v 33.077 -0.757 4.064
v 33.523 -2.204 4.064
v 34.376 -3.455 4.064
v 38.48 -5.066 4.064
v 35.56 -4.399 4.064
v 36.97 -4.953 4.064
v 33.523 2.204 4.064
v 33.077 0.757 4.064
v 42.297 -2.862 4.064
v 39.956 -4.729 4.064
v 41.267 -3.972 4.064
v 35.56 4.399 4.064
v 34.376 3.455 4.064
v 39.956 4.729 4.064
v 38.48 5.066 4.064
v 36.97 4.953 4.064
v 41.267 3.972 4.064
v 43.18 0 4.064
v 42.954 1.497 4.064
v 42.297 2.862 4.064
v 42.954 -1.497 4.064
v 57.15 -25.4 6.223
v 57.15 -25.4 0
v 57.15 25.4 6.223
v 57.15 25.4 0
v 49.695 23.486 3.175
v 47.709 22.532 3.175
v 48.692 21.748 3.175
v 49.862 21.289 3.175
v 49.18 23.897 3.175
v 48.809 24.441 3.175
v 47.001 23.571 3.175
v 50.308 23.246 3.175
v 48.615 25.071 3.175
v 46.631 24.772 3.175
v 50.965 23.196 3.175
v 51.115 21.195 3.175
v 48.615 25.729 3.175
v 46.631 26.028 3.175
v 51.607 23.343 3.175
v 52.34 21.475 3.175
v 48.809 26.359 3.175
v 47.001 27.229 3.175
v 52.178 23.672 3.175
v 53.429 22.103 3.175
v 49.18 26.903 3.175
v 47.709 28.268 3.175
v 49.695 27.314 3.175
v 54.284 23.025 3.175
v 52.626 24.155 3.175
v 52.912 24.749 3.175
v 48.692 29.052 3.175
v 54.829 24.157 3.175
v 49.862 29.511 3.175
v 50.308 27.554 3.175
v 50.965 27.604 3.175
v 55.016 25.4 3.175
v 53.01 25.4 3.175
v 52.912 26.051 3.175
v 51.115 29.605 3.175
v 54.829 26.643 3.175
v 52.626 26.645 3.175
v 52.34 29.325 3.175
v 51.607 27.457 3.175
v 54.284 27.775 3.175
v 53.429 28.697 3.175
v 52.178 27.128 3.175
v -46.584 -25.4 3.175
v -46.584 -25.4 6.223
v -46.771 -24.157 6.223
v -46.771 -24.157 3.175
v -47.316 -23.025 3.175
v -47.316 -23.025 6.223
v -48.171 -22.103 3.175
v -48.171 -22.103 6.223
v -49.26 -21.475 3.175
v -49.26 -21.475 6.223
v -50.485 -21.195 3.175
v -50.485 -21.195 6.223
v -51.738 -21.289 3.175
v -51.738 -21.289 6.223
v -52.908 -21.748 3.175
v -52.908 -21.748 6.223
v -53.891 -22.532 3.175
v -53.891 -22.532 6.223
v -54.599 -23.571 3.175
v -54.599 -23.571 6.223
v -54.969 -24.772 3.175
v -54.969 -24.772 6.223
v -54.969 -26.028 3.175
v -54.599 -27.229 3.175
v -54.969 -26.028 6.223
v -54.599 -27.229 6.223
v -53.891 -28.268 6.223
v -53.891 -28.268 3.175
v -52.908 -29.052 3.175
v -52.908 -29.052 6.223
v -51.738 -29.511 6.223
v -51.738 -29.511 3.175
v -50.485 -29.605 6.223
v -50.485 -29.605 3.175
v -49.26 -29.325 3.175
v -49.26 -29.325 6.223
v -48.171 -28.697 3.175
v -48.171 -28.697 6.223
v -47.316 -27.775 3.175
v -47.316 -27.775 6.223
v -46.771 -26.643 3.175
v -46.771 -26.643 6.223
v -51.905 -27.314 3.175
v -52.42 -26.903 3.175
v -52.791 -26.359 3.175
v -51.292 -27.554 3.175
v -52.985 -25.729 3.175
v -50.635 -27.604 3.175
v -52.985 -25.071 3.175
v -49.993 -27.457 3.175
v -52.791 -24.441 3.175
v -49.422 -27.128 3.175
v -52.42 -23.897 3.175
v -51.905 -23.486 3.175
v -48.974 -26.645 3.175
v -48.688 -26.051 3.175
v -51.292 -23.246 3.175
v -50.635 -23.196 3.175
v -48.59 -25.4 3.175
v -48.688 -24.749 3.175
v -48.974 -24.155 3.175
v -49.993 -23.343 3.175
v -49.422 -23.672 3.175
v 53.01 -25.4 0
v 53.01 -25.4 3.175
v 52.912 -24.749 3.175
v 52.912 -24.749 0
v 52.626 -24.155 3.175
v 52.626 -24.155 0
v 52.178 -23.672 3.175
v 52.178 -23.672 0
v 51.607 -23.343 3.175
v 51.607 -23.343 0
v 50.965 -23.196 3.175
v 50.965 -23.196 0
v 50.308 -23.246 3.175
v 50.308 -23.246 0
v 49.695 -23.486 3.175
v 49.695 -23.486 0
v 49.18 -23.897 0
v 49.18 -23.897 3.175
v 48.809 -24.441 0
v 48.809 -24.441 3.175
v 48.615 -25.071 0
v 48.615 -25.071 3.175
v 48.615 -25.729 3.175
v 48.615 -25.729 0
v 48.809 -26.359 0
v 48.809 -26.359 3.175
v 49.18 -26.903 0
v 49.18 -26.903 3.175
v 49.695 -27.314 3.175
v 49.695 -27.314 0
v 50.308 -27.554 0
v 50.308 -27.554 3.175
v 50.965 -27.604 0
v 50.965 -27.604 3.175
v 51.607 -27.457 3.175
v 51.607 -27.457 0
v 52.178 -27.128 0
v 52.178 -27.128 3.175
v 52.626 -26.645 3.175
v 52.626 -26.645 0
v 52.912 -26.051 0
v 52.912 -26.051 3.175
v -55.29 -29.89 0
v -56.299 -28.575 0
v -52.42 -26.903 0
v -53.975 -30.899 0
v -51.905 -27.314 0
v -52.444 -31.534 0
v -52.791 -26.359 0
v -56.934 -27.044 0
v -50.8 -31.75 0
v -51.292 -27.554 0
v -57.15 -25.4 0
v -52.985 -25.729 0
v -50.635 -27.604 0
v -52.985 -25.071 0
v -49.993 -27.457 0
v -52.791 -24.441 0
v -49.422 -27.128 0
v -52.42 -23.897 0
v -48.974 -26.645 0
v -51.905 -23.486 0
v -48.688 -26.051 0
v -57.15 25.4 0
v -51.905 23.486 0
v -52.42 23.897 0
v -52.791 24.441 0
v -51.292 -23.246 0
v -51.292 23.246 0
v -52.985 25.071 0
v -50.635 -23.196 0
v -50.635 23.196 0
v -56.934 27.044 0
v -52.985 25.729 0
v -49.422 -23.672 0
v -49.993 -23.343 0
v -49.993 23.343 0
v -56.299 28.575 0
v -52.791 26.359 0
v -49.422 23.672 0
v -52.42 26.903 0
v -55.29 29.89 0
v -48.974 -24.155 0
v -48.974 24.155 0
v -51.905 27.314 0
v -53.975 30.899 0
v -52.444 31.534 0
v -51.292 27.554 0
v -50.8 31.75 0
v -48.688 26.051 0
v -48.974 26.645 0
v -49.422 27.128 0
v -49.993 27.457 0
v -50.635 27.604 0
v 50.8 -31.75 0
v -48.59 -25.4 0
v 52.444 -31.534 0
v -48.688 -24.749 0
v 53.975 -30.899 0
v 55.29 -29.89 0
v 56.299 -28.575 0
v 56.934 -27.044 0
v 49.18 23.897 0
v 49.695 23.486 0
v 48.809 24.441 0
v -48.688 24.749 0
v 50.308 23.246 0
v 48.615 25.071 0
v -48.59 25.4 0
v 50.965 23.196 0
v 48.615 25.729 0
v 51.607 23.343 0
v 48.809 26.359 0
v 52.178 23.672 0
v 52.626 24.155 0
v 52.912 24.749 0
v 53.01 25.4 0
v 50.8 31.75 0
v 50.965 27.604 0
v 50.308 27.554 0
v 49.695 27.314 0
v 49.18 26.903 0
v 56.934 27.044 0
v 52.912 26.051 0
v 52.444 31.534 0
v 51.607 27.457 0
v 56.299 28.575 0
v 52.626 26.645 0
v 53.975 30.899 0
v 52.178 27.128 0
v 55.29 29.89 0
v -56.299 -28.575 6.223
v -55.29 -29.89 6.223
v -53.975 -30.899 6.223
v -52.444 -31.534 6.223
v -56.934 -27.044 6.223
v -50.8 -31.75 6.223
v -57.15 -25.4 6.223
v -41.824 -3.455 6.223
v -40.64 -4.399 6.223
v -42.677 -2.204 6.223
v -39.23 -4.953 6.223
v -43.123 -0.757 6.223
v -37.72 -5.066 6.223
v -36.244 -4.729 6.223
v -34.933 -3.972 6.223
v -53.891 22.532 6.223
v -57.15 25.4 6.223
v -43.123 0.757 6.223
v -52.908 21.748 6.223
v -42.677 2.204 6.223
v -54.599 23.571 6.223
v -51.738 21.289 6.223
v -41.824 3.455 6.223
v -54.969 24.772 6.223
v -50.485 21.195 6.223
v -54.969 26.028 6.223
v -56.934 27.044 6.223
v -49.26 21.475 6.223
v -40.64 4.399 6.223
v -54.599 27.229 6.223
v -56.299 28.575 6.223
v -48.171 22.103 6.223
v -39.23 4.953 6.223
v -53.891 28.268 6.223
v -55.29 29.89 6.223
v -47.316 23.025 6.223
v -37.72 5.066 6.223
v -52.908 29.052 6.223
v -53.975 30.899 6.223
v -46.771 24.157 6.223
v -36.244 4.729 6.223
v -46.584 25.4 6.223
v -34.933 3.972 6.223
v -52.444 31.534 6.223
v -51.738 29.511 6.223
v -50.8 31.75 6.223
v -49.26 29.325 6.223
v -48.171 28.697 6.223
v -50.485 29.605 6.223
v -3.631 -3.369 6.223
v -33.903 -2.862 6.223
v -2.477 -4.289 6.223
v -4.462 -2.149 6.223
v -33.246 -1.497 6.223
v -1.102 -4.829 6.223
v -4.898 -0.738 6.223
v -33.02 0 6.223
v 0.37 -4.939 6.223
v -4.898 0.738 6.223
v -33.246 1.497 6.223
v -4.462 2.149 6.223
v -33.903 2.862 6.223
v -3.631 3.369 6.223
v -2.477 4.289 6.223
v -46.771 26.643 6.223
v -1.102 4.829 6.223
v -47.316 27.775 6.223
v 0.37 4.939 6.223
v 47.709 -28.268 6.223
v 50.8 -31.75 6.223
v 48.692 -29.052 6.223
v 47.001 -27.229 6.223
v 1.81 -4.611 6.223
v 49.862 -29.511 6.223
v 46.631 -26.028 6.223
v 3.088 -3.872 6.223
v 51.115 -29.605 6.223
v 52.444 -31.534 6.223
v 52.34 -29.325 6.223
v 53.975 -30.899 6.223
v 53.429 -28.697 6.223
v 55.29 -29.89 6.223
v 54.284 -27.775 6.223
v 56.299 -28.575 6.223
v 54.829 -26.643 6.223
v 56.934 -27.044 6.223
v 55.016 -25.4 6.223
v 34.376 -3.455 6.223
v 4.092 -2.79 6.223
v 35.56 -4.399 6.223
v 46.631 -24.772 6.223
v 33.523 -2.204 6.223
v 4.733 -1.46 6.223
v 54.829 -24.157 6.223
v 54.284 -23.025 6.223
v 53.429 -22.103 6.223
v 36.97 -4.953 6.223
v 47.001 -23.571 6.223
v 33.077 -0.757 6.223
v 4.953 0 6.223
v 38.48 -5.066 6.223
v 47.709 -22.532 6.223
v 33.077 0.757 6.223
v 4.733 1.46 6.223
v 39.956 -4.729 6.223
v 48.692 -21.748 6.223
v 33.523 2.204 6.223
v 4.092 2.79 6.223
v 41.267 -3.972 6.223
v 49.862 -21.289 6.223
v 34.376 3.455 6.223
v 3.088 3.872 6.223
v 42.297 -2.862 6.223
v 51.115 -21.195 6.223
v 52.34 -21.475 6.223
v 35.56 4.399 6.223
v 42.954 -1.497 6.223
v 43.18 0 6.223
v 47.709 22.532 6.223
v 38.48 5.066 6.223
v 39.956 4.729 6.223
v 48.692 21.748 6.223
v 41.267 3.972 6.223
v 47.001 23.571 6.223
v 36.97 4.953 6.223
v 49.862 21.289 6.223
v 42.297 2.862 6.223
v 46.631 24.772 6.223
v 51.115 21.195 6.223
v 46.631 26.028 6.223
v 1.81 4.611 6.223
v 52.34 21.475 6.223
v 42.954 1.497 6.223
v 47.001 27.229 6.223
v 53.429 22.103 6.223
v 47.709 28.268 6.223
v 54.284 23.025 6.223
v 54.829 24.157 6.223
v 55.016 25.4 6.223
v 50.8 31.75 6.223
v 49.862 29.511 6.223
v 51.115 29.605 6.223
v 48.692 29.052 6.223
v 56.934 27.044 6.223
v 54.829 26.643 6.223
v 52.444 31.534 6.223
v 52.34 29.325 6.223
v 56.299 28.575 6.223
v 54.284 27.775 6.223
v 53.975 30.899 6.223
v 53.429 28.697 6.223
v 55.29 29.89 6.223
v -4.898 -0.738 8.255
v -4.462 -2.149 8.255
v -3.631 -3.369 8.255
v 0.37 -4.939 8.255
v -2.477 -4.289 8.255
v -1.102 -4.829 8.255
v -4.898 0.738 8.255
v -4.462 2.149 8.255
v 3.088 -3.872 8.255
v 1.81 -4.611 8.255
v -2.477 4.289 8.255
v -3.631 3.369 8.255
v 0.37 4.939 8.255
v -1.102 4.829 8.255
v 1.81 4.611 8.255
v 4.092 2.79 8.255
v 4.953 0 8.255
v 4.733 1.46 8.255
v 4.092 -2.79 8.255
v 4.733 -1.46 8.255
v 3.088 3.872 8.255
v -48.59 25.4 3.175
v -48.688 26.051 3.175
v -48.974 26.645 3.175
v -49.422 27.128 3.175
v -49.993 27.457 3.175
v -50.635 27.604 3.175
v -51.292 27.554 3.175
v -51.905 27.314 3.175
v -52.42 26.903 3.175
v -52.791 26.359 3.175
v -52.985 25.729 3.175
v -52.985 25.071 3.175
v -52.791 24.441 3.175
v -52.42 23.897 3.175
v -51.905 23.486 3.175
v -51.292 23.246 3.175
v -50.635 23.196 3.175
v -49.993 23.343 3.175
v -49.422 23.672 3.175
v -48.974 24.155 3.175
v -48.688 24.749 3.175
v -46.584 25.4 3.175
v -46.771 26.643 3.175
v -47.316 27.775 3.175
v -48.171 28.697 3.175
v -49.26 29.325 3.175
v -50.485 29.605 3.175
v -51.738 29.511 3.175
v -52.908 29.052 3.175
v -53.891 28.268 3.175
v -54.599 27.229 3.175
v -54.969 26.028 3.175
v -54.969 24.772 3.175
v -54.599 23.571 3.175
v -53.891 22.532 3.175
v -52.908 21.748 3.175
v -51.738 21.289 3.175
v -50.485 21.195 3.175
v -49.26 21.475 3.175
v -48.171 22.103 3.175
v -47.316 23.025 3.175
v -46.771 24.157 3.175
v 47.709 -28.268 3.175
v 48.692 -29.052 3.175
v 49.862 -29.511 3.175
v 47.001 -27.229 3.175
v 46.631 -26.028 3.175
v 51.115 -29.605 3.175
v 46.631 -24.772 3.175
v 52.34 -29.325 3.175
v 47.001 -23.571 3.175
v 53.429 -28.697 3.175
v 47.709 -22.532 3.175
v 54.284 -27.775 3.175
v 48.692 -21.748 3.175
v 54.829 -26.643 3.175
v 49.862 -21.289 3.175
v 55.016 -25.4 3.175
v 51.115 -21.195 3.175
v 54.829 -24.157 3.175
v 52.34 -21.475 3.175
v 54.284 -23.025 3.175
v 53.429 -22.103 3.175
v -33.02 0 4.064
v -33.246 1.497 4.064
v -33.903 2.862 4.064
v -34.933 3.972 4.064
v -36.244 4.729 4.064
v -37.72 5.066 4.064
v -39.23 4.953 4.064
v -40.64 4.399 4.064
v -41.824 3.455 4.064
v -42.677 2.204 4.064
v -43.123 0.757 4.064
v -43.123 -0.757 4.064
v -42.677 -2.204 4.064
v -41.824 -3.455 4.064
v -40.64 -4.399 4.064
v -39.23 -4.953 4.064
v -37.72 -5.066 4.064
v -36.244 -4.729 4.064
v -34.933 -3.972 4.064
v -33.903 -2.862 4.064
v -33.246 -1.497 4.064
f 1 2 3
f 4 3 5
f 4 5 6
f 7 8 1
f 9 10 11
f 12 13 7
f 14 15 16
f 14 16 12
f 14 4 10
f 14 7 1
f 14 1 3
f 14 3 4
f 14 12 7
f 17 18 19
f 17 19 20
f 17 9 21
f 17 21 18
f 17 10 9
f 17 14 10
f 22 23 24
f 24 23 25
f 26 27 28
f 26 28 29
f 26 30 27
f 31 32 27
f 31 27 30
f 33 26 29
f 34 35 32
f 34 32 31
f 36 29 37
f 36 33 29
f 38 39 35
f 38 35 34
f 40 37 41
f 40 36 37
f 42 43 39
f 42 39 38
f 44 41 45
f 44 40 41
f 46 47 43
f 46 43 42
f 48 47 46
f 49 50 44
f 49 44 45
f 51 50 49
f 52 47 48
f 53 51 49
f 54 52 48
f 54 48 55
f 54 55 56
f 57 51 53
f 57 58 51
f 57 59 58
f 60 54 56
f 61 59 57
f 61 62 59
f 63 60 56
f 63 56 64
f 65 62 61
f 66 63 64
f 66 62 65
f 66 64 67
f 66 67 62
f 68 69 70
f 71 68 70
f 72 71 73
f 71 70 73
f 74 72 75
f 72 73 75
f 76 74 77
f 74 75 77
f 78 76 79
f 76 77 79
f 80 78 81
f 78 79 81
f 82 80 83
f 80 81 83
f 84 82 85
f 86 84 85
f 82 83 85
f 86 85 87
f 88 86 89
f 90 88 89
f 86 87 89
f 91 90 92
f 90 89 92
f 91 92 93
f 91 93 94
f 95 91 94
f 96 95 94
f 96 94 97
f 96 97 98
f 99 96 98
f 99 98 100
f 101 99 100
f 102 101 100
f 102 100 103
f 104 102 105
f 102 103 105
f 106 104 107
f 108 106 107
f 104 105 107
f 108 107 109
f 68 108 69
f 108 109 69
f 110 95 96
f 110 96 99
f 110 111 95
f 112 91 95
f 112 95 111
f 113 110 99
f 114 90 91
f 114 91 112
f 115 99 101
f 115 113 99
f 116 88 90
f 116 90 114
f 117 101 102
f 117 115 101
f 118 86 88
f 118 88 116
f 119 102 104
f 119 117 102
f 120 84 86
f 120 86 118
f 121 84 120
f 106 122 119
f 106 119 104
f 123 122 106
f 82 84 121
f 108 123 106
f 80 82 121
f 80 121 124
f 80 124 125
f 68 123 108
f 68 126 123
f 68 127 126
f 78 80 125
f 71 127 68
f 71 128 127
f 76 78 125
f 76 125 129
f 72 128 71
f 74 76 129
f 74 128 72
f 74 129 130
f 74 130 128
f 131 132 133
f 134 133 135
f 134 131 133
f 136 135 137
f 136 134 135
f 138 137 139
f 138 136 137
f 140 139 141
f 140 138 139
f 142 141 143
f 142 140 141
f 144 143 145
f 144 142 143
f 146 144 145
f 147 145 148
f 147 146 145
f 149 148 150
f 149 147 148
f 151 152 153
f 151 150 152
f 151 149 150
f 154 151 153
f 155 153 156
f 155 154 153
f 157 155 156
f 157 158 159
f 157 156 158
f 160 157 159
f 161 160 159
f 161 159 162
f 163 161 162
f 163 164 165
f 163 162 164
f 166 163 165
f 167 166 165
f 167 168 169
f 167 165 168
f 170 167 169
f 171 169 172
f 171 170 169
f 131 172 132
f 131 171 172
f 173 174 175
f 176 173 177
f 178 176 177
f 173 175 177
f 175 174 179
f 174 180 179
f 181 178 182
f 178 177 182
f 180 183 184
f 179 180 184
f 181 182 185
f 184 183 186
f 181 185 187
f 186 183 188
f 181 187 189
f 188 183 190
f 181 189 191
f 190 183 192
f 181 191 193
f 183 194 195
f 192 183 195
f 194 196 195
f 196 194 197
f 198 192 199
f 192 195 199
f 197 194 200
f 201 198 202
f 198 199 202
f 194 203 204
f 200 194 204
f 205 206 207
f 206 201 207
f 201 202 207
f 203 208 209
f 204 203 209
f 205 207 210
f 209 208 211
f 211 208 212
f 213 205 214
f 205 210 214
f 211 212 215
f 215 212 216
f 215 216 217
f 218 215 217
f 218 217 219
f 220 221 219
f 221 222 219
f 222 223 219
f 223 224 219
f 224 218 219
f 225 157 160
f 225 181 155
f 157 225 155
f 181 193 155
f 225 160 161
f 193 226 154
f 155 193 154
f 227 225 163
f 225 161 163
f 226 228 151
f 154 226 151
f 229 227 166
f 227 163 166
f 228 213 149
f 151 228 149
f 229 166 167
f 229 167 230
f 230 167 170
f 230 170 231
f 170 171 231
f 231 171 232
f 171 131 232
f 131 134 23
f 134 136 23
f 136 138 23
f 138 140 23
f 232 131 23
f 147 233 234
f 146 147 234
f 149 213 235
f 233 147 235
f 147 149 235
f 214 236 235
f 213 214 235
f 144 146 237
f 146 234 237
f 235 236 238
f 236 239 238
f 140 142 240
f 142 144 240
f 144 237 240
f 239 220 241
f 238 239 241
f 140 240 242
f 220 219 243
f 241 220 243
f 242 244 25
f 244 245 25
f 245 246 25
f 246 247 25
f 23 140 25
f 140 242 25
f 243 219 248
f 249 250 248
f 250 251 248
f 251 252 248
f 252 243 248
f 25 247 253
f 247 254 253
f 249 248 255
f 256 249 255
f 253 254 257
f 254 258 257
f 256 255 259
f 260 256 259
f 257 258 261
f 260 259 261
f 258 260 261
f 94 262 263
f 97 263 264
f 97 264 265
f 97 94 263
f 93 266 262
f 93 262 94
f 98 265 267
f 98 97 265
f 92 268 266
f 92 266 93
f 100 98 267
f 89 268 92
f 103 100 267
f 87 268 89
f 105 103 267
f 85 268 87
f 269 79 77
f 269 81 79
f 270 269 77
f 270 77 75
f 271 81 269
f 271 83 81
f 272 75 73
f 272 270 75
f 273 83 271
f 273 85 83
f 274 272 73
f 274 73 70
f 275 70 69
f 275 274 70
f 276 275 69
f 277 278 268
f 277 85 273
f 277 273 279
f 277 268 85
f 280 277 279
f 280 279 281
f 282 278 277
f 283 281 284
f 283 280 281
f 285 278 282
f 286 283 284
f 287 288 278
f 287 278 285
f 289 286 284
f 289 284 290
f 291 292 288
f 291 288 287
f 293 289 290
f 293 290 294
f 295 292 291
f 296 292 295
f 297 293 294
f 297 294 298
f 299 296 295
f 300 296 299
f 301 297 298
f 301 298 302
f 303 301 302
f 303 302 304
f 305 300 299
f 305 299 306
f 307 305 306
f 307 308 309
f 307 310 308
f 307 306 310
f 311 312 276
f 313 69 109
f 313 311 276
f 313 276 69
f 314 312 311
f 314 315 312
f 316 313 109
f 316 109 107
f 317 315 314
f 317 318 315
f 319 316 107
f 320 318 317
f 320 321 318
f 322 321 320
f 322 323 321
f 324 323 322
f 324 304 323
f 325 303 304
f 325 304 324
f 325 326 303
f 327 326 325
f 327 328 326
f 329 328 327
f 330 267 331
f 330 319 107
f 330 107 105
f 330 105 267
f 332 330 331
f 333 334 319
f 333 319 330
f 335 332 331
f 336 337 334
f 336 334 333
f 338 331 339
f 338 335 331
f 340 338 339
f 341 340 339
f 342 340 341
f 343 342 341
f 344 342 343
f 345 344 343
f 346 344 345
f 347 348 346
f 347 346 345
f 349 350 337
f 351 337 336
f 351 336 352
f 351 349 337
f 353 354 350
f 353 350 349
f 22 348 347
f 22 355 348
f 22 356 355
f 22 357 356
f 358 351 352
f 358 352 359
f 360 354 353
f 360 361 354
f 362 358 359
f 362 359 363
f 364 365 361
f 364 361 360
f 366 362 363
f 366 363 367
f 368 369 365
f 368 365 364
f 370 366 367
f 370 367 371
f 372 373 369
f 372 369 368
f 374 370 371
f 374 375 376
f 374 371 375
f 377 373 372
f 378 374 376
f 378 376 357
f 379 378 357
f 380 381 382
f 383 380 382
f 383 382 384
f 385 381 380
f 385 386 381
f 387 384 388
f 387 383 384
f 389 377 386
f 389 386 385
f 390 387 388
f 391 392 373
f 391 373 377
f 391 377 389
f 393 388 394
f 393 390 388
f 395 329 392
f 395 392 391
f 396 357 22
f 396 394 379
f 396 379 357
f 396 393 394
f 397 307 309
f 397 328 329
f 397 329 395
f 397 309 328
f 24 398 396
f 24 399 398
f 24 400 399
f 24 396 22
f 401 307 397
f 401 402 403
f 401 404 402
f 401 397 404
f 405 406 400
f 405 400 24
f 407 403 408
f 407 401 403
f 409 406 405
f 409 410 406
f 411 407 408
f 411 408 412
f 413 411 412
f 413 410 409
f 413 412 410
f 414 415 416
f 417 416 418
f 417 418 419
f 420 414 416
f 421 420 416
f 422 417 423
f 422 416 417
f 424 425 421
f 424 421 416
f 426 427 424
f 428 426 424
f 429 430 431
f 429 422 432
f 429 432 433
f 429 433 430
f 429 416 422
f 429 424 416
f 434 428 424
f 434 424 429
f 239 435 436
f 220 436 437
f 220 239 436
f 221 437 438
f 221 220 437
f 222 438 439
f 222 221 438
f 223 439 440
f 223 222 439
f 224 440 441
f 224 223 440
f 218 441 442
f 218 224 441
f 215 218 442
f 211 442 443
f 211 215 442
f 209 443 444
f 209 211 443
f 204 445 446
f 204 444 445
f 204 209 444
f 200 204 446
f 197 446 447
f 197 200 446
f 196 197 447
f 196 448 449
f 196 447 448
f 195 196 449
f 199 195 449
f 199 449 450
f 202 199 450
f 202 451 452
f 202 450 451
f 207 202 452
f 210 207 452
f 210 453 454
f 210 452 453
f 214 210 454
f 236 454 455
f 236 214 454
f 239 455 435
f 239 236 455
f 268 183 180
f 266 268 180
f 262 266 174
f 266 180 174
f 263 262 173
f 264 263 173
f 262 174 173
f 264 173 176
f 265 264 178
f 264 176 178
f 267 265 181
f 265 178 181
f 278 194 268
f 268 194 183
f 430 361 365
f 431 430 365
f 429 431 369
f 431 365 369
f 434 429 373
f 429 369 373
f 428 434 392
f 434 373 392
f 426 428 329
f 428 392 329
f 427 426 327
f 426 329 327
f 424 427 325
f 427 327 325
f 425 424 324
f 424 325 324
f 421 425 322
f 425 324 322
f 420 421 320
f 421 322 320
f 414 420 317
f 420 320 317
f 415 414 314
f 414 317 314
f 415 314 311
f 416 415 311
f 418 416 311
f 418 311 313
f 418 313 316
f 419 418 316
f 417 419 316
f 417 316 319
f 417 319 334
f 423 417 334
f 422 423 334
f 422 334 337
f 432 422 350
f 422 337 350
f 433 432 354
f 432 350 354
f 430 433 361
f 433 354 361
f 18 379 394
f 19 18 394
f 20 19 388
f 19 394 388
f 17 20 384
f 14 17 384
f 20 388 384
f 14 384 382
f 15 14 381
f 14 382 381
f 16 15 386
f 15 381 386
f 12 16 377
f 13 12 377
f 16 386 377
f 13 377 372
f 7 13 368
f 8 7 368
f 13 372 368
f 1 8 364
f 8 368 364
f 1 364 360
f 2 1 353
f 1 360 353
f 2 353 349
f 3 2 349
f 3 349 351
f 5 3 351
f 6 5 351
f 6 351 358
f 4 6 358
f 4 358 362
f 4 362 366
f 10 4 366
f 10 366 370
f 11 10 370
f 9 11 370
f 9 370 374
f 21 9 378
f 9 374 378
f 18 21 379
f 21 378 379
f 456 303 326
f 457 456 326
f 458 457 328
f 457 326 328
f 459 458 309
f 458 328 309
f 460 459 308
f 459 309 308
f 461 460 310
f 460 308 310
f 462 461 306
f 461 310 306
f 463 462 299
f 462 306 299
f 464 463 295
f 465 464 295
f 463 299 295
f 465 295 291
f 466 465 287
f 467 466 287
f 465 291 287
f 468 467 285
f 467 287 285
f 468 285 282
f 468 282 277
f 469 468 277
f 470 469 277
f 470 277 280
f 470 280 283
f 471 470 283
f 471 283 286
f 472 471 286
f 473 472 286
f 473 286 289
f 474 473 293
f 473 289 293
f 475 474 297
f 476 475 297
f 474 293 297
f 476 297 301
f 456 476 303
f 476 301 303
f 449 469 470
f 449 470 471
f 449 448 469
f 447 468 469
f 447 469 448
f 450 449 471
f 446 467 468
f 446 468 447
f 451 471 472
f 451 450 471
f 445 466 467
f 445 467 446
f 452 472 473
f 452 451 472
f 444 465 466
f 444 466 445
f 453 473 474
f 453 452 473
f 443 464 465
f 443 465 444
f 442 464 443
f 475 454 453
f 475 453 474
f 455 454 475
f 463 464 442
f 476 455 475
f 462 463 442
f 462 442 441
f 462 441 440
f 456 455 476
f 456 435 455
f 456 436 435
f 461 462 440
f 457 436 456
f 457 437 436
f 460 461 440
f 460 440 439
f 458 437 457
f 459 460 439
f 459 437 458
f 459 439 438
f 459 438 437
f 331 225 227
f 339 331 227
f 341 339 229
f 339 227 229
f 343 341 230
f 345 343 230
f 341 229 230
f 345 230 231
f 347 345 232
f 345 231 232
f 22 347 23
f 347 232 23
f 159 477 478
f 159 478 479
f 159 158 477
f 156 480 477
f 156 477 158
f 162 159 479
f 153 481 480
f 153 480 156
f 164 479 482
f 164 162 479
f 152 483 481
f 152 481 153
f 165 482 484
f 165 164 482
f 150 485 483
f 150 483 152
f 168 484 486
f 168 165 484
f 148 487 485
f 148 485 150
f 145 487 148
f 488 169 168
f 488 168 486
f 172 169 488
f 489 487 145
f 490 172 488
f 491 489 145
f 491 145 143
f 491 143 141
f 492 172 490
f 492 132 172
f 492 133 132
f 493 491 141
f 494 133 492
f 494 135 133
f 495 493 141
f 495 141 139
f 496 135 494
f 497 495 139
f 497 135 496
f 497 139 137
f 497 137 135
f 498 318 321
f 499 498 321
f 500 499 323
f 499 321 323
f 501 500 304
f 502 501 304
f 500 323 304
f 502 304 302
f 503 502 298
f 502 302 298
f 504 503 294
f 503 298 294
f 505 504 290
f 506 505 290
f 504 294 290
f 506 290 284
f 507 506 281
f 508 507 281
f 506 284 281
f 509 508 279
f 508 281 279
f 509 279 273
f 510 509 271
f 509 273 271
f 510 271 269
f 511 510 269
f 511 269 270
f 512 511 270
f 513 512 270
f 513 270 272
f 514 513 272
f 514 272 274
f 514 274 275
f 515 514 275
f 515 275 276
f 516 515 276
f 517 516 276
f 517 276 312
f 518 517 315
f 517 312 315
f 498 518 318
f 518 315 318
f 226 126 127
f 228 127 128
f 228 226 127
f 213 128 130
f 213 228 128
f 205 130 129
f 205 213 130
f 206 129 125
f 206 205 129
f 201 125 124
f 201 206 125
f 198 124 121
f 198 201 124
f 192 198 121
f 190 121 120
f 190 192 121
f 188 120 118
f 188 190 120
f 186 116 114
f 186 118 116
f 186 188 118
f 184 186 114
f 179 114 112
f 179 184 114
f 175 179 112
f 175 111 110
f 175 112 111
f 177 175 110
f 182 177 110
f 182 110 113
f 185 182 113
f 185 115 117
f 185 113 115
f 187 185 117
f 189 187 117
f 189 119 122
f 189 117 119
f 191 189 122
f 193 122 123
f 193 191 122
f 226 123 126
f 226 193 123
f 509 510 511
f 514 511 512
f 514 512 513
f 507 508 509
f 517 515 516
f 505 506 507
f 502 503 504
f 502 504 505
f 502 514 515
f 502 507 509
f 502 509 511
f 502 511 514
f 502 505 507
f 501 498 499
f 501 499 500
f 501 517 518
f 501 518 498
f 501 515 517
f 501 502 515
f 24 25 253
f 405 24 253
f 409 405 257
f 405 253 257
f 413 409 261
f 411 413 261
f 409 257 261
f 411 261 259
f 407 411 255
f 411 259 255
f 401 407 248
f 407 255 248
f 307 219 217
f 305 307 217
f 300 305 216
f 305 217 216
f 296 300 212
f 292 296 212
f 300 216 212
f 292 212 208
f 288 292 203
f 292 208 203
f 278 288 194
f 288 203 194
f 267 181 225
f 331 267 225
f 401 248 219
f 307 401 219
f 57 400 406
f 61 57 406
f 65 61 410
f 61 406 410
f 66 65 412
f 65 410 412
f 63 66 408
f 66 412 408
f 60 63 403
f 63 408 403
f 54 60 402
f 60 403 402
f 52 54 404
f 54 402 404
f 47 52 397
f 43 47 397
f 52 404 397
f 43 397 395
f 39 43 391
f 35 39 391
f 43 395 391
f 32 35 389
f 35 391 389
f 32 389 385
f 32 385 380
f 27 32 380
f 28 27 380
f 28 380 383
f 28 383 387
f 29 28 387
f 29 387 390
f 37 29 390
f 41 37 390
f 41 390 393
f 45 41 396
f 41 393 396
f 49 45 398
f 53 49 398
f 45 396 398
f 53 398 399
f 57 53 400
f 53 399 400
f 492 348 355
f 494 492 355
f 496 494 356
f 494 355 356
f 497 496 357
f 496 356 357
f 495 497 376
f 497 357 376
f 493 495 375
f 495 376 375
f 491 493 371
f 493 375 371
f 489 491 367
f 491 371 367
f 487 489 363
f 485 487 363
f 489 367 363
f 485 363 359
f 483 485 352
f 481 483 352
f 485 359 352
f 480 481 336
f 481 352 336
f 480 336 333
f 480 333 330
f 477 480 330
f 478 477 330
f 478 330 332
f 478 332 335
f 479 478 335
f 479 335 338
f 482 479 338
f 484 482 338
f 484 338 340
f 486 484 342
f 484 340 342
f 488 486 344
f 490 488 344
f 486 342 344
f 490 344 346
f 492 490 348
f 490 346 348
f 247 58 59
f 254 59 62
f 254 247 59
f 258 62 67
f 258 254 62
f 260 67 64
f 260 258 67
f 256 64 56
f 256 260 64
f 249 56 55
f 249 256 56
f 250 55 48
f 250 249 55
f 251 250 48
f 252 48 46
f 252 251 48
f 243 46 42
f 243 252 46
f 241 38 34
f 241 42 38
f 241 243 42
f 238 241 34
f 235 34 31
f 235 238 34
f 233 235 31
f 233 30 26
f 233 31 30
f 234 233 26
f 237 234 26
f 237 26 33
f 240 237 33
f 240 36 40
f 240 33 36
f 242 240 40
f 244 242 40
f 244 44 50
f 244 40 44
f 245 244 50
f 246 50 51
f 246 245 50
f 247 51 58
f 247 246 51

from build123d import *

# Parameters (mm, degrees)
SKETCH1_R           = 2.2098
BOSS_EXTRUDE1_DEPTH = 6.223
SKETCH2_R           = 4.2164
CUT_EXTRUDE1_DEPTH  = 3.048
SKETCH3_R           = 5.08
CUT_EXTRUDE2_DEPTH  = 2.159
SKETCH4_R           = 4.953
BOSS_EXTRUDE2_DEPTH = 2.032


with BuildPart() as part:
    # Sketch1 → Boss-Extrude1 (new body)
    with BuildSketch(Plane.XY):
        with BuildLine():
            Line((-50.8, -31.75), (50.8, -31.75))
            ThreePointArc((50.8, -31.75), (55.290128061, -29.890128061), (57.15, -25.4))
            Line((57.15, -25.4), (57.15, 25.4))
            ThreePointArc((57.15, 25.4), (55.290128061, 29.890128061), (50.8, 31.75))
            Line((50.8, 31.75), (-50.8, 31.75))
            ThreePointArc((-50.8, 31.75), (-55.290128061, 29.890128061), (-57.15, 25.4))
            Line((-57.15, 25.4), (-57.15, -25.4))
            ThreePointArc((-57.15, -25.4), (-55.290128061, -29.890128061), (-50.8, -31.75))
        make_face()
        with Locations((-50.8, -25.4)):
            Circle(SKETCH1_R, mode=Mode.SUBTRACT)
        with Locations((-50.8, 25.4)):
            Circle(SKETCH1_R, mode=Mode.SUBTRACT)
        with Locations((50.8, 25.4)):
            Circle(SKETCH1_R, mode=Mode.SUBTRACT)
        with Locations((50.8, -25.4)):
            Circle(SKETCH1_R, mode=Mode.SUBTRACT)
    extrude(amount=BOSS_EXTRUDE1_DEPTH)

    # Sketch2 → Cut-Extrude1 (cut)
    with BuildSketch(Plane.XY.offset(6.223)):
        with Locations((-50.8, 25.4)):
            Circle(SKETCH2_R)
        with Locations((50.8, 25.4)):
            Circle(SKETCH2_R)
        with Locations((50.8, -25.4)):
            Circle(SKETCH2_R)
        with Locations((-50.8, -25.4)):
            Circle(SKETCH2_R)
    extrude(amount=-CUT_EXTRUDE1_DEPTH, mode=Mode.SUBTRACT)

    # Sketch3 → Cut-Extrude2 (cut)
    with BuildSketch(Plane.XY.offset(6.223)):
        with Locations((38.1, 0)):
            Circle(SKETCH3_R)
        with Locations((-38.1, 0)):
            Circle(SKETCH3_R)
    extrude(amount=-CUT_EXTRUDE2_DEPTH, mode=Mode.SUBTRACT)

    # Sketch4 → Boss-Extrude2 (add)
    with BuildSketch(Plane.XY.offset(6.223)):
        Circle(SKETCH4_R)
    extrude(amount=BOSS_EXTRUDE2_DEPTH)


solid = part.part
